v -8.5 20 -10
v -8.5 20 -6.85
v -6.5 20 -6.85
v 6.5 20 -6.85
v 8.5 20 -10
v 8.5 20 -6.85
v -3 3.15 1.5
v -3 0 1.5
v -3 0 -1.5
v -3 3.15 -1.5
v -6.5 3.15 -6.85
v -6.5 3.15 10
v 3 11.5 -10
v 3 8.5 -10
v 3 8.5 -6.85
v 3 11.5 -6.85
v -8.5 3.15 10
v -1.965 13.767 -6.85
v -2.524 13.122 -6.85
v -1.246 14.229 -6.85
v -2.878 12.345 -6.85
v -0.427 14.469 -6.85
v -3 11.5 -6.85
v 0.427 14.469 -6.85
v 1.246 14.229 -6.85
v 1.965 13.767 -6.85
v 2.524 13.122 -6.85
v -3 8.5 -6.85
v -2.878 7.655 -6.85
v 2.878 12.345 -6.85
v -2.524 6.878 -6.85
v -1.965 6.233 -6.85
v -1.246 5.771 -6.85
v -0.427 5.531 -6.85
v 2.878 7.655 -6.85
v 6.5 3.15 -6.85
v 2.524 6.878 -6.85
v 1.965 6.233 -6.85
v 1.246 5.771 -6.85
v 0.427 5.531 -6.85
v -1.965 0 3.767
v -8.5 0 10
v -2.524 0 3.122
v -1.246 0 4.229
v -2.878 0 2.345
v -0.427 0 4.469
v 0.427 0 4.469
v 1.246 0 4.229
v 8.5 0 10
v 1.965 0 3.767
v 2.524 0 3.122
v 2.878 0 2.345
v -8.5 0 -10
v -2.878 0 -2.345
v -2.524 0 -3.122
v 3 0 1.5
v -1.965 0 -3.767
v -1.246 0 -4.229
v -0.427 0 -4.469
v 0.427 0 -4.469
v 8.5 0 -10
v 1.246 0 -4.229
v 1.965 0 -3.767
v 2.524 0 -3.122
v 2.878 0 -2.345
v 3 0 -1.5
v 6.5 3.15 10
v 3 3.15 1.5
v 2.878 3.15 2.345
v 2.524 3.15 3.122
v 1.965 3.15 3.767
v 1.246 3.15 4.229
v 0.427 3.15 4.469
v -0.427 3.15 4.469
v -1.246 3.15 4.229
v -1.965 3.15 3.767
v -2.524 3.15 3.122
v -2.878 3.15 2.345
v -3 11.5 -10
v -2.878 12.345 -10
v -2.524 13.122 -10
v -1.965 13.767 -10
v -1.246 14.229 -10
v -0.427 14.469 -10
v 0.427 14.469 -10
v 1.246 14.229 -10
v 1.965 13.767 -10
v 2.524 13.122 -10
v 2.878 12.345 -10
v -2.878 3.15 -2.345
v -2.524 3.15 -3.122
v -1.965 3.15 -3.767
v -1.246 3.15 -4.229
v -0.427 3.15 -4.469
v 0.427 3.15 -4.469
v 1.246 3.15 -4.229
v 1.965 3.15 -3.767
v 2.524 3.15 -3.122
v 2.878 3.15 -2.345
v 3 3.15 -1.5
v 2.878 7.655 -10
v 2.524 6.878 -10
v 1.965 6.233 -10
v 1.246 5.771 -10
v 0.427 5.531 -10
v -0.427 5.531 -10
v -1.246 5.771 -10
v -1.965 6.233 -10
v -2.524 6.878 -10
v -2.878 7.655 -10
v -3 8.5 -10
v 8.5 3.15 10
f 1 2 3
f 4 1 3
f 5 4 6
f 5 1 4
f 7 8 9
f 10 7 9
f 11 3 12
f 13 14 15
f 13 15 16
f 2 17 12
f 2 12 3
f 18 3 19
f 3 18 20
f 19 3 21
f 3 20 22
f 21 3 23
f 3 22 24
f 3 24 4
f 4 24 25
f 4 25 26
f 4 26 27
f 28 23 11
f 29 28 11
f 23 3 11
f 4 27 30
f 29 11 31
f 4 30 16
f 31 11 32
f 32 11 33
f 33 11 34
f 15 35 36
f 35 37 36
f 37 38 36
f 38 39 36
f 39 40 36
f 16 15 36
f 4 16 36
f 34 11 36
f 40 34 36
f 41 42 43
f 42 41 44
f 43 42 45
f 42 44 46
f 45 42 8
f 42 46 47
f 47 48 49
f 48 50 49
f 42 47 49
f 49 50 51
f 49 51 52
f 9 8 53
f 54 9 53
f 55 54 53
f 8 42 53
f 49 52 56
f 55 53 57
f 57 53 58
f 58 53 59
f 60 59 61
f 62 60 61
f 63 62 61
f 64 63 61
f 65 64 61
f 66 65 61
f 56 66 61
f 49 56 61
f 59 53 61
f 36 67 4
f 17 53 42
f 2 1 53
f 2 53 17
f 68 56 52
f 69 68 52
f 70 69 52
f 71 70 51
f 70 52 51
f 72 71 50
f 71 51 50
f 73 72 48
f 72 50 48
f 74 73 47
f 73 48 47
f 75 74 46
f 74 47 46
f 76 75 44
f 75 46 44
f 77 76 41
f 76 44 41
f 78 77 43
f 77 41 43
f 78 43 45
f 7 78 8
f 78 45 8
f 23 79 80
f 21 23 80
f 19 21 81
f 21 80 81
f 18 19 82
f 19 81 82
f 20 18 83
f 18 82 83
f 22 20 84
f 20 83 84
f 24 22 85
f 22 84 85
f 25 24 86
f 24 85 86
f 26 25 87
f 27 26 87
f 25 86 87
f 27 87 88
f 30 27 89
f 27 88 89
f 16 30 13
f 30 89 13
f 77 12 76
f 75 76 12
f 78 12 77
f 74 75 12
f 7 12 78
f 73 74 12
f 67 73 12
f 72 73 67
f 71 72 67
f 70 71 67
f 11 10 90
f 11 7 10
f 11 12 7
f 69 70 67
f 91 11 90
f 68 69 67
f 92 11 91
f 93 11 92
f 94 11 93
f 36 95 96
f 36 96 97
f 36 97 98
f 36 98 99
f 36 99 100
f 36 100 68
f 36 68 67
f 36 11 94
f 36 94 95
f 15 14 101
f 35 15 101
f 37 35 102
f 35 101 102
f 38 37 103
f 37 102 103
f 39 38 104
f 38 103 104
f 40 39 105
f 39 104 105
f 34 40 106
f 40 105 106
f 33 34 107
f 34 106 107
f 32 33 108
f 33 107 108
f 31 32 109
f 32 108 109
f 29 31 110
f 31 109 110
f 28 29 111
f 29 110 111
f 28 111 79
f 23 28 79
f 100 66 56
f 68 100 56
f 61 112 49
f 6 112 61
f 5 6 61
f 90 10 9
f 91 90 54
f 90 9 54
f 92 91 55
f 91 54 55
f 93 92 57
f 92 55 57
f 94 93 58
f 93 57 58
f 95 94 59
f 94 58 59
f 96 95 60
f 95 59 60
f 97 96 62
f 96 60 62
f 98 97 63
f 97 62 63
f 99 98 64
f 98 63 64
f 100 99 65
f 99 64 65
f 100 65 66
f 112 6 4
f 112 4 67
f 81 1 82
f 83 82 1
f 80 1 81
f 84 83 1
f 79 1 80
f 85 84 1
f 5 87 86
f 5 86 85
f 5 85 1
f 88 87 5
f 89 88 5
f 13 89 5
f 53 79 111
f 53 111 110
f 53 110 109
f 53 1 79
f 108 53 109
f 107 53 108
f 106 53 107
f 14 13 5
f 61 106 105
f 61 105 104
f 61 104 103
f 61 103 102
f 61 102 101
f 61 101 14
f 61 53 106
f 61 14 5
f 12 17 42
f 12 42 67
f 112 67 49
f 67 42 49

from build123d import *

# Parameters (mm, degrees)
SKETCH1_W           = 17
SKETCH1_H           = 20
BOSS_EXTRUDE1_DEPTH = 3.15
SKETCH2_W           = 17
SKETCH2_H           = 3.15
BOSS_EXTRUDE2_DEPTH = 16.85
CUT_EXTRUDE1_REACH  = 25.922
SKETCH3_R           = 3
CUT_EXTRUDE2_REACH  = 31.534
SKETCH4_R           = 3
SKETCH4_W           = 6
SKETCH4_H           = 3
BOSS_EXTRUDE3_DEPTH = 2
BOSS_EXTRUDE4_DEPTH = 2


with BuildPart() as part:
    # Sketch1 → Boss-Extrude1 (new body)
    with BuildSketch(Plane(origin=(0, 0, 0), x_dir=(1, 0, 0), z_dir=(0, 1, 0))):
        Rectangle(SKETCH1_W, SKETCH1_H)
    extrude(amount=BOSS_EXTRUDE1_DEPTH)

    # Sketch2 → Boss-Extrude2 (add)
    with BuildSketch(Plane(origin=(0, 3.15, 0), x_dir=(1, 0, 0), z_dir=(0, 1, 0))):
        with Locations((0, 8.425)):
            Rectangle(SKETCH2_W, SKETCH2_H)
    extrude(amount=BOSS_EXTRUDE2_DEPTH)

    # Sketch3 → Cut-Extrude1 (cut, up to next)
    with BuildSketch(Plane.XZ, mode=Mode.PRIVATE) as cut_extrude1_sk1:
        with BuildLine():
            ThreePointArc((-3, -1.5), (0, -4.5), (3, -1.5))
            Line((3, -1.5), (0, -1.5))
            Line((0, -1.5), (-3, -1.5))
        make_face()
    cut_extrude1_tool1 = extrude(cut_extrude1_sk1.sketch, amount=-CUT_EXTRUDE1_REACH, mode=Mode.PRIVATE) & part.part
    # Sketch3 → Cut-Extrude1 (cut, up to next)
    with BuildSketch(Plane.XZ, mode=Mode.PRIVATE) as cut_extrude1_sk2:
        with Locations((0, 1.5)):
            Circle(SKETCH3_R)
    cut_extrude1_tool2 = extrude(cut_extrude1_sk2.sketch, amount=-CUT_EXTRUDE1_REACH, mode=Mode.PRIVATE) & part.part
    # Sketch3 → Cut-Extrude1 (cut, up to next)
    with BuildSketch(Plane.XZ, mode=Mode.PRIVATE) as cut_extrude1_sk3:
        with Locations((0, -1.5)):
            Circle(SKETCH3_R)
    cut_extrude1_tool3 = extrude(cut_extrude1_sk3.sketch, amount=-CUT_EXTRUDE1_REACH, mode=Mode.PRIVATE) & part.part
    # Sketch3 → Cut-Extrude1 (cut, up to next)
    with BuildSketch(Plane.XZ, mode=Mode.PRIVATE) as cut_extrude1_sk4:
        with BuildLine():
            Line((0, -1.5), (3, -1.5))
            ThreePointArc((3, -1.5), (2.897777479, -0.723542865), (2.598076211, 0))
            ThreePointArc((2.598076211, 0), (1.5, -1.098076211), (0, -1.5))
        make_face()
    cut_extrude1_tool4 = extrude(cut_extrude1_sk4.sketch, amount=-CUT_EXTRUDE1_REACH, mode=Mode.PRIVATE) & part.part
    # Sketch3 → Cut-Extrude1 (cut, up to next)
    with BuildSketch(Plane.XZ, mode=Mode.PRIVATE) as cut_extrude1_sk5:
        with BuildLine():
            ThreePointArc((0, -1.5), (-1.5, -1.098076211), (-2.598076211, 0))
            ThreePointArc((-2.598076211, 0), (-2.897777479, -0.723542865), (-3, -1.5))
            Line((-3, -1.5), (0, -1.5))
        make_face()
    cut_extrude1_tool5 = extrude(cut_extrude1_sk5.sketch, amount=-CUT_EXTRUDE1_REACH, mode=Mode.PRIVATE) & part.part
    # Sketch3 → Cut-Extrude1 (cut, up to next)
    with BuildSketch(Plane.XZ, mode=Mode.PRIVATE) as cut_extrude1_sk6:
        with BuildLine():
            ThreePointArc((2.598076211, 0), (2.897777479, 0.723542865), (3, 1.5))
            Line((3, 1.5), (0, 1.5))
            ThreePointArc((0, 1.5), (1.5, 1.098076211), (2.598076211, 0))
        make_face()
    cut_extrude1_tool6 = extrude(cut_extrude1_sk6.sketch, amount=-CUT_EXTRUDE1_REACH, mode=Mode.PRIVATE) & part.part
    # Sketch3 → Cut-Extrude1 (cut, up to next)
    with BuildSketch(Plane.XZ, mode=Mode.PRIVATE) as cut_extrude1_sk7:
        with BuildLine():
            ThreePointArc((-2.598076211, 0), (-1.5, 1.098076211), (0, 1.5))
            Line((0, 1.5), (-3, 1.5))
            ThreePointArc((-3, 1.5), (-2.897777479, 0.723542865), (-2.598076211, 0))
        make_face()
    cut_extrude1_tool7 = extrude(cut_extrude1_sk7.sketch, amount=-CUT_EXTRUDE1_REACH, mode=Mode.PRIVATE) & part.part
    # Sketch3 → Cut-Extrude1 (cut, up to next)
    with BuildSketch(Plane.XZ, mode=Mode.PRIVATE) as cut_extrude1_sk8:
        with BuildLine():
            Line((3, -1.5), (3, 1.5))
            ThreePointArc((3, 1.5), (2.897777479, 0.723542865), (2.598076211, 0))
            ThreePointArc((2.598076211, 0), (2.897777479, -0.723542865), (3, -1.5))
        make_face()
    cut_extrude1_tool8 = extrude(cut_extrude1_sk8.sketch, amount=-CUT_EXTRUDE1_REACH, mode=Mode.PRIVATE) & part.part
    # Sketch3 → Cut-Extrude1 (cut, up to next)
    with BuildSketch(Plane.XZ, mode=Mode.PRIVATE) as cut_extrude1_sk9:
        with BuildLine():
            Line((0, 1.5), (3, 1.5))
            ThreePointArc((3, 1.5), (0, 4.5), (-3, 1.5))
            Line((-3, 1.5), (0, 1.5))
        make_face()
    cut_extrude1_tool9 = extrude(cut_extrude1_sk9.sketch, amount=-CUT_EXTRUDE1_REACH, mode=Mode.PRIVATE) & part.part
    # Sketch3 → Cut-Extrude1 (cut, up to next)
    with BuildSketch(Plane.XZ, mode=Mode.PRIVATE) as cut_extrude1_sk10:
        with BuildLine():
            Line((0, -1.5), (3, -1.5))
            ThreePointArc((3, -1.5), (2.897777479, -0.723542865), (2.598076211, 0))
            ThreePointArc((2.598076211, 0), (1.5, -1.098076211), (0, -1.5))
        make_face()
    cut_extrude1_tool10 = extrude(cut_extrude1_sk10.sketch, amount=-CUT_EXTRUDE1_REACH, mode=Mode.PRIVATE) & part.part
    # Sketch3 → Cut-Extrude1 (cut, up to next)
    with BuildSketch(Plane.XZ, mode=Mode.PRIVATE) as cut_extrude1_sk11:
        with BuildLine():
            ThreePointArc((0, -1.5), (-1.5, -1.098076211), (-2.598076211, 0))
            ThreePointArc((-2.598076211, 0), (-2.897777479, -0.723542865), (-3, -1.5))
            Line((-3, -1.5), (0, -1.5))
        make_face()
    cut_extrude1_tool11 = extrude(cut_extrude1_sk11.sketch, amount=-CUT_EXTRUDE1_REACH, mode=Mode.PRIVATE) & part.part
    # Sketch3 → Cut-Extrude1 (cut, up to next)
    with BuildSketch(Plane.XZ, mode=Mode.PRIVATE) as cut_extrude1_sk12:
        with BuildLine():
            ThreePointArc((-2.598076211, 0), (-2.897777479, 0.723542865), (-3, 1.5))
            Line((-3, 1.5), (-3, -1.5))
            ThreePointArc((-3, -1.5), (-2.897777479, -0.723542865), (-2.598076211, 0))
        make_face()
    cut_extrude1_tool12 = extrude(cut_extrude1_sk12.sketch, amount=-CUT_EXTRUDE1_REACH, mode=Mode.PRIVATE) & part.part
    # Sketch3 → Cut-Extrude1 (cut, up to next)
    with BuildSketch(Plane.XZ, mode=Mode.PRIVATE) as cut_extrude1_sk13:
        with BuildLine():
            ThreePointArc((2.598076211, 0), (2.897777479, 0.723542865), (3, 1.5))
            Line((3, 1.5), (0, 1.5))
            ThreePointArc((0, 1.5), (1.5, 1.098076211), (2.598076211, 0))
        make_face()
    cut_extrude1_tool13 = extrude(cut_extrude1_sk13.sketch, amount=-CUT_EXTRUDE1_REACH, mode=Mode.PRIVATE) & part.part
    # Sketch3 → Cut-Extrude1 (cut, up to next)
    with BuildSketch(Plane.XZ, mode=Mode.PRIVATE) as cut_extrude1_sk14:
        with BuildLine():
            ThreePointArc((-2.598076211, 0), (-1.5, 1.098076211), (0, 1.5))
            Line((0, 1.5), (-3, 1.5))
            ThreePointArc((-3, 1.5), (-2.897777479, 0.723542865), (-2.598076211, 0))
        make_face()
    cut_extrude1_tool14 = extrude(cut_extrude1_sk14.sketch, amount=-CUT_EXTRUDE1_REACH, mode=Mode.PRIVATE) & part.part
    add(cut_extrude1_tool1.solids().sort_by_distance((0, 0, -2.77324))[0], mode=Mode.SUBTRACT)
    add(cut_extrude1_tool2.solids().sort_by_distance((0, 0, 1.5))[0], mode=Mode.SUBTRACT)
    add(cut_extrude1_tool3.solids().sort_by_distance((0, 0, -1.5))[0], mode=Mode.SUBTRACT)
    add(cut_extrude1_tool4.solids().sort_by_distance((2.19025, 0, -1.040207))[0], mode=Mode.SUBTRACT)
    add(cut_extrude1_tool5.solids().sort_by_distance((-2.19025, 0, -1.040207))[0], mode=Mode.SUBTRACT)
    add(cut_extrude1_tool6.solids().sort_by_distance((2.19025, 0, 1.040207))[0], mode=Mode.SUBTRACT)
    add(cut_extrude1_tool7.solids().sort_by_distance((-2.19025, 0, 1.040207))[0], mode=Mode.SUBTRACT)
    add(cut_extrude1_tool8.solids().sort_by_distance((2.880946, 0, 0))[0], mode=Mode.SUBTRACT)
    add(cut_extrude1_tool9.solids().sort_by_distance((0, 0, 2.77324))[0], mode=Mode.SUBTRACT)
    add(cut_extrude1_tool10.solids().sort_by_distance((2.19025, 0, -1.040207))[0], mode=Mode.SUBTRACT)
    add(cut_extrude1_tool11.solids().sort_by_distance((-2.19025, 0, -1.040207))[0], mode=Mode.SUBTRACT)
    add(cut_extrude1_tool12.solids().sort_by_distance((-2.880946, 0, 0))[0], mode=Mode.SUBTRACT)
    add(cut_extrude1_tool13.solids().sort_by_distance((2.19025, 0, 1.040207))[0], mode=Mode.SUBTRACT)
    add(cut_extrude1_tool14.solids().sort_by_distance((-2.19025, 0, 1.040207))[0], mode=Mode.SUBTRACT)

    # Sketch4 → Cut-Extrude2 (cut, up to next)
    with BuildSketch(Plane(origin=(0, 0, -10), x_dir=(-1, 0, 0), z_dir=(0, 0, -1)), mode=Mode.PRIVATE) as cut_extrude2_sk1:
        with Locations((0, 8.5)):
            Circle(SKETCH4_R)
    cut_extrude2_tool1 = extrude(cut_extrude2_sk1.sketch, amount=-CUT_EXTRUDE2_REACH, mode=Mode.PRIVATE) & part.part
    # Sketch4 → Cut-Extrude2 (cut, up to next)
    with BuildSketch(Plane(origin=(0, 0, -10), x_dir=(-1, 0, 0), z_dir=(0, 0, -1)), mode=Mode.PRIVATE) as cut_extrude2_sk2:
        with Locations((0, 11.5)):
            Circle(SKETCH4_R)
    cut_extrude2_tool2 = extrude(cut_extrude2_sk2.sketch, amount=-CUT_EXTRUDE2_REACH, mode=Mode.PRIVATE) & part.part
    # Sketch4 → Cut-Extrude2 (cut, up to next)
    with BuildSketch(Plane(origin=(0, 0, -10), x_dir=(-1, 0, 0), z_dir=(0, 0, -1)), mode=Mode.PRIVATE) as cut_extrude2_sk3:
        with Locations((0, 10)):
            Rectangle(SKETCH4_W, SKETCH4_H)
    cut_extrude2_tool3 = extrude(cut_extrude2_sk3.sketch, amount=-CUT_EXTRUDE2_REACH, mode=Mode.PRIVATE) & part.part
    add(cut_extrude2_tool1.solids().sort_by_distance((0, 8.5, -10))[0], mode=Mode.SUBTRACT)
    add(cut_extrude2_tool2.solids().sort_by_distance((0, 11.5, -10))[0], mode=Mode.SUBTRACT)
    add(cut_extrude2_tool3.solids().sort_by_distance((0, 10, -10))[0], mode=Mode.SUBTRACT)

    # Sketch5 → Boss-Extrude3 (add)
    with BuildSketch(Plane(origin=(8.5, 0, 0), x_dir=(0, 0, -1), z_dir=(1, 0, 0))):
        Polygon((6.85, 20), (-10, 3.15), (6.85, 3.15), align=None)
    extrude(amount=-BOSS_EXTRUDE3_DEPTH)

    # Sketch6 → Boss-Extrude4 (add)
    with BuildSketch(Plane.ZY.offset(8.5)):
        Polygon((10, 3.15), (-6.85, 20), (-6.85, 3.15), align=None)
    extrude(amount=-BOSS_EXTRUDE4_DEPTH)


solid = part.part
